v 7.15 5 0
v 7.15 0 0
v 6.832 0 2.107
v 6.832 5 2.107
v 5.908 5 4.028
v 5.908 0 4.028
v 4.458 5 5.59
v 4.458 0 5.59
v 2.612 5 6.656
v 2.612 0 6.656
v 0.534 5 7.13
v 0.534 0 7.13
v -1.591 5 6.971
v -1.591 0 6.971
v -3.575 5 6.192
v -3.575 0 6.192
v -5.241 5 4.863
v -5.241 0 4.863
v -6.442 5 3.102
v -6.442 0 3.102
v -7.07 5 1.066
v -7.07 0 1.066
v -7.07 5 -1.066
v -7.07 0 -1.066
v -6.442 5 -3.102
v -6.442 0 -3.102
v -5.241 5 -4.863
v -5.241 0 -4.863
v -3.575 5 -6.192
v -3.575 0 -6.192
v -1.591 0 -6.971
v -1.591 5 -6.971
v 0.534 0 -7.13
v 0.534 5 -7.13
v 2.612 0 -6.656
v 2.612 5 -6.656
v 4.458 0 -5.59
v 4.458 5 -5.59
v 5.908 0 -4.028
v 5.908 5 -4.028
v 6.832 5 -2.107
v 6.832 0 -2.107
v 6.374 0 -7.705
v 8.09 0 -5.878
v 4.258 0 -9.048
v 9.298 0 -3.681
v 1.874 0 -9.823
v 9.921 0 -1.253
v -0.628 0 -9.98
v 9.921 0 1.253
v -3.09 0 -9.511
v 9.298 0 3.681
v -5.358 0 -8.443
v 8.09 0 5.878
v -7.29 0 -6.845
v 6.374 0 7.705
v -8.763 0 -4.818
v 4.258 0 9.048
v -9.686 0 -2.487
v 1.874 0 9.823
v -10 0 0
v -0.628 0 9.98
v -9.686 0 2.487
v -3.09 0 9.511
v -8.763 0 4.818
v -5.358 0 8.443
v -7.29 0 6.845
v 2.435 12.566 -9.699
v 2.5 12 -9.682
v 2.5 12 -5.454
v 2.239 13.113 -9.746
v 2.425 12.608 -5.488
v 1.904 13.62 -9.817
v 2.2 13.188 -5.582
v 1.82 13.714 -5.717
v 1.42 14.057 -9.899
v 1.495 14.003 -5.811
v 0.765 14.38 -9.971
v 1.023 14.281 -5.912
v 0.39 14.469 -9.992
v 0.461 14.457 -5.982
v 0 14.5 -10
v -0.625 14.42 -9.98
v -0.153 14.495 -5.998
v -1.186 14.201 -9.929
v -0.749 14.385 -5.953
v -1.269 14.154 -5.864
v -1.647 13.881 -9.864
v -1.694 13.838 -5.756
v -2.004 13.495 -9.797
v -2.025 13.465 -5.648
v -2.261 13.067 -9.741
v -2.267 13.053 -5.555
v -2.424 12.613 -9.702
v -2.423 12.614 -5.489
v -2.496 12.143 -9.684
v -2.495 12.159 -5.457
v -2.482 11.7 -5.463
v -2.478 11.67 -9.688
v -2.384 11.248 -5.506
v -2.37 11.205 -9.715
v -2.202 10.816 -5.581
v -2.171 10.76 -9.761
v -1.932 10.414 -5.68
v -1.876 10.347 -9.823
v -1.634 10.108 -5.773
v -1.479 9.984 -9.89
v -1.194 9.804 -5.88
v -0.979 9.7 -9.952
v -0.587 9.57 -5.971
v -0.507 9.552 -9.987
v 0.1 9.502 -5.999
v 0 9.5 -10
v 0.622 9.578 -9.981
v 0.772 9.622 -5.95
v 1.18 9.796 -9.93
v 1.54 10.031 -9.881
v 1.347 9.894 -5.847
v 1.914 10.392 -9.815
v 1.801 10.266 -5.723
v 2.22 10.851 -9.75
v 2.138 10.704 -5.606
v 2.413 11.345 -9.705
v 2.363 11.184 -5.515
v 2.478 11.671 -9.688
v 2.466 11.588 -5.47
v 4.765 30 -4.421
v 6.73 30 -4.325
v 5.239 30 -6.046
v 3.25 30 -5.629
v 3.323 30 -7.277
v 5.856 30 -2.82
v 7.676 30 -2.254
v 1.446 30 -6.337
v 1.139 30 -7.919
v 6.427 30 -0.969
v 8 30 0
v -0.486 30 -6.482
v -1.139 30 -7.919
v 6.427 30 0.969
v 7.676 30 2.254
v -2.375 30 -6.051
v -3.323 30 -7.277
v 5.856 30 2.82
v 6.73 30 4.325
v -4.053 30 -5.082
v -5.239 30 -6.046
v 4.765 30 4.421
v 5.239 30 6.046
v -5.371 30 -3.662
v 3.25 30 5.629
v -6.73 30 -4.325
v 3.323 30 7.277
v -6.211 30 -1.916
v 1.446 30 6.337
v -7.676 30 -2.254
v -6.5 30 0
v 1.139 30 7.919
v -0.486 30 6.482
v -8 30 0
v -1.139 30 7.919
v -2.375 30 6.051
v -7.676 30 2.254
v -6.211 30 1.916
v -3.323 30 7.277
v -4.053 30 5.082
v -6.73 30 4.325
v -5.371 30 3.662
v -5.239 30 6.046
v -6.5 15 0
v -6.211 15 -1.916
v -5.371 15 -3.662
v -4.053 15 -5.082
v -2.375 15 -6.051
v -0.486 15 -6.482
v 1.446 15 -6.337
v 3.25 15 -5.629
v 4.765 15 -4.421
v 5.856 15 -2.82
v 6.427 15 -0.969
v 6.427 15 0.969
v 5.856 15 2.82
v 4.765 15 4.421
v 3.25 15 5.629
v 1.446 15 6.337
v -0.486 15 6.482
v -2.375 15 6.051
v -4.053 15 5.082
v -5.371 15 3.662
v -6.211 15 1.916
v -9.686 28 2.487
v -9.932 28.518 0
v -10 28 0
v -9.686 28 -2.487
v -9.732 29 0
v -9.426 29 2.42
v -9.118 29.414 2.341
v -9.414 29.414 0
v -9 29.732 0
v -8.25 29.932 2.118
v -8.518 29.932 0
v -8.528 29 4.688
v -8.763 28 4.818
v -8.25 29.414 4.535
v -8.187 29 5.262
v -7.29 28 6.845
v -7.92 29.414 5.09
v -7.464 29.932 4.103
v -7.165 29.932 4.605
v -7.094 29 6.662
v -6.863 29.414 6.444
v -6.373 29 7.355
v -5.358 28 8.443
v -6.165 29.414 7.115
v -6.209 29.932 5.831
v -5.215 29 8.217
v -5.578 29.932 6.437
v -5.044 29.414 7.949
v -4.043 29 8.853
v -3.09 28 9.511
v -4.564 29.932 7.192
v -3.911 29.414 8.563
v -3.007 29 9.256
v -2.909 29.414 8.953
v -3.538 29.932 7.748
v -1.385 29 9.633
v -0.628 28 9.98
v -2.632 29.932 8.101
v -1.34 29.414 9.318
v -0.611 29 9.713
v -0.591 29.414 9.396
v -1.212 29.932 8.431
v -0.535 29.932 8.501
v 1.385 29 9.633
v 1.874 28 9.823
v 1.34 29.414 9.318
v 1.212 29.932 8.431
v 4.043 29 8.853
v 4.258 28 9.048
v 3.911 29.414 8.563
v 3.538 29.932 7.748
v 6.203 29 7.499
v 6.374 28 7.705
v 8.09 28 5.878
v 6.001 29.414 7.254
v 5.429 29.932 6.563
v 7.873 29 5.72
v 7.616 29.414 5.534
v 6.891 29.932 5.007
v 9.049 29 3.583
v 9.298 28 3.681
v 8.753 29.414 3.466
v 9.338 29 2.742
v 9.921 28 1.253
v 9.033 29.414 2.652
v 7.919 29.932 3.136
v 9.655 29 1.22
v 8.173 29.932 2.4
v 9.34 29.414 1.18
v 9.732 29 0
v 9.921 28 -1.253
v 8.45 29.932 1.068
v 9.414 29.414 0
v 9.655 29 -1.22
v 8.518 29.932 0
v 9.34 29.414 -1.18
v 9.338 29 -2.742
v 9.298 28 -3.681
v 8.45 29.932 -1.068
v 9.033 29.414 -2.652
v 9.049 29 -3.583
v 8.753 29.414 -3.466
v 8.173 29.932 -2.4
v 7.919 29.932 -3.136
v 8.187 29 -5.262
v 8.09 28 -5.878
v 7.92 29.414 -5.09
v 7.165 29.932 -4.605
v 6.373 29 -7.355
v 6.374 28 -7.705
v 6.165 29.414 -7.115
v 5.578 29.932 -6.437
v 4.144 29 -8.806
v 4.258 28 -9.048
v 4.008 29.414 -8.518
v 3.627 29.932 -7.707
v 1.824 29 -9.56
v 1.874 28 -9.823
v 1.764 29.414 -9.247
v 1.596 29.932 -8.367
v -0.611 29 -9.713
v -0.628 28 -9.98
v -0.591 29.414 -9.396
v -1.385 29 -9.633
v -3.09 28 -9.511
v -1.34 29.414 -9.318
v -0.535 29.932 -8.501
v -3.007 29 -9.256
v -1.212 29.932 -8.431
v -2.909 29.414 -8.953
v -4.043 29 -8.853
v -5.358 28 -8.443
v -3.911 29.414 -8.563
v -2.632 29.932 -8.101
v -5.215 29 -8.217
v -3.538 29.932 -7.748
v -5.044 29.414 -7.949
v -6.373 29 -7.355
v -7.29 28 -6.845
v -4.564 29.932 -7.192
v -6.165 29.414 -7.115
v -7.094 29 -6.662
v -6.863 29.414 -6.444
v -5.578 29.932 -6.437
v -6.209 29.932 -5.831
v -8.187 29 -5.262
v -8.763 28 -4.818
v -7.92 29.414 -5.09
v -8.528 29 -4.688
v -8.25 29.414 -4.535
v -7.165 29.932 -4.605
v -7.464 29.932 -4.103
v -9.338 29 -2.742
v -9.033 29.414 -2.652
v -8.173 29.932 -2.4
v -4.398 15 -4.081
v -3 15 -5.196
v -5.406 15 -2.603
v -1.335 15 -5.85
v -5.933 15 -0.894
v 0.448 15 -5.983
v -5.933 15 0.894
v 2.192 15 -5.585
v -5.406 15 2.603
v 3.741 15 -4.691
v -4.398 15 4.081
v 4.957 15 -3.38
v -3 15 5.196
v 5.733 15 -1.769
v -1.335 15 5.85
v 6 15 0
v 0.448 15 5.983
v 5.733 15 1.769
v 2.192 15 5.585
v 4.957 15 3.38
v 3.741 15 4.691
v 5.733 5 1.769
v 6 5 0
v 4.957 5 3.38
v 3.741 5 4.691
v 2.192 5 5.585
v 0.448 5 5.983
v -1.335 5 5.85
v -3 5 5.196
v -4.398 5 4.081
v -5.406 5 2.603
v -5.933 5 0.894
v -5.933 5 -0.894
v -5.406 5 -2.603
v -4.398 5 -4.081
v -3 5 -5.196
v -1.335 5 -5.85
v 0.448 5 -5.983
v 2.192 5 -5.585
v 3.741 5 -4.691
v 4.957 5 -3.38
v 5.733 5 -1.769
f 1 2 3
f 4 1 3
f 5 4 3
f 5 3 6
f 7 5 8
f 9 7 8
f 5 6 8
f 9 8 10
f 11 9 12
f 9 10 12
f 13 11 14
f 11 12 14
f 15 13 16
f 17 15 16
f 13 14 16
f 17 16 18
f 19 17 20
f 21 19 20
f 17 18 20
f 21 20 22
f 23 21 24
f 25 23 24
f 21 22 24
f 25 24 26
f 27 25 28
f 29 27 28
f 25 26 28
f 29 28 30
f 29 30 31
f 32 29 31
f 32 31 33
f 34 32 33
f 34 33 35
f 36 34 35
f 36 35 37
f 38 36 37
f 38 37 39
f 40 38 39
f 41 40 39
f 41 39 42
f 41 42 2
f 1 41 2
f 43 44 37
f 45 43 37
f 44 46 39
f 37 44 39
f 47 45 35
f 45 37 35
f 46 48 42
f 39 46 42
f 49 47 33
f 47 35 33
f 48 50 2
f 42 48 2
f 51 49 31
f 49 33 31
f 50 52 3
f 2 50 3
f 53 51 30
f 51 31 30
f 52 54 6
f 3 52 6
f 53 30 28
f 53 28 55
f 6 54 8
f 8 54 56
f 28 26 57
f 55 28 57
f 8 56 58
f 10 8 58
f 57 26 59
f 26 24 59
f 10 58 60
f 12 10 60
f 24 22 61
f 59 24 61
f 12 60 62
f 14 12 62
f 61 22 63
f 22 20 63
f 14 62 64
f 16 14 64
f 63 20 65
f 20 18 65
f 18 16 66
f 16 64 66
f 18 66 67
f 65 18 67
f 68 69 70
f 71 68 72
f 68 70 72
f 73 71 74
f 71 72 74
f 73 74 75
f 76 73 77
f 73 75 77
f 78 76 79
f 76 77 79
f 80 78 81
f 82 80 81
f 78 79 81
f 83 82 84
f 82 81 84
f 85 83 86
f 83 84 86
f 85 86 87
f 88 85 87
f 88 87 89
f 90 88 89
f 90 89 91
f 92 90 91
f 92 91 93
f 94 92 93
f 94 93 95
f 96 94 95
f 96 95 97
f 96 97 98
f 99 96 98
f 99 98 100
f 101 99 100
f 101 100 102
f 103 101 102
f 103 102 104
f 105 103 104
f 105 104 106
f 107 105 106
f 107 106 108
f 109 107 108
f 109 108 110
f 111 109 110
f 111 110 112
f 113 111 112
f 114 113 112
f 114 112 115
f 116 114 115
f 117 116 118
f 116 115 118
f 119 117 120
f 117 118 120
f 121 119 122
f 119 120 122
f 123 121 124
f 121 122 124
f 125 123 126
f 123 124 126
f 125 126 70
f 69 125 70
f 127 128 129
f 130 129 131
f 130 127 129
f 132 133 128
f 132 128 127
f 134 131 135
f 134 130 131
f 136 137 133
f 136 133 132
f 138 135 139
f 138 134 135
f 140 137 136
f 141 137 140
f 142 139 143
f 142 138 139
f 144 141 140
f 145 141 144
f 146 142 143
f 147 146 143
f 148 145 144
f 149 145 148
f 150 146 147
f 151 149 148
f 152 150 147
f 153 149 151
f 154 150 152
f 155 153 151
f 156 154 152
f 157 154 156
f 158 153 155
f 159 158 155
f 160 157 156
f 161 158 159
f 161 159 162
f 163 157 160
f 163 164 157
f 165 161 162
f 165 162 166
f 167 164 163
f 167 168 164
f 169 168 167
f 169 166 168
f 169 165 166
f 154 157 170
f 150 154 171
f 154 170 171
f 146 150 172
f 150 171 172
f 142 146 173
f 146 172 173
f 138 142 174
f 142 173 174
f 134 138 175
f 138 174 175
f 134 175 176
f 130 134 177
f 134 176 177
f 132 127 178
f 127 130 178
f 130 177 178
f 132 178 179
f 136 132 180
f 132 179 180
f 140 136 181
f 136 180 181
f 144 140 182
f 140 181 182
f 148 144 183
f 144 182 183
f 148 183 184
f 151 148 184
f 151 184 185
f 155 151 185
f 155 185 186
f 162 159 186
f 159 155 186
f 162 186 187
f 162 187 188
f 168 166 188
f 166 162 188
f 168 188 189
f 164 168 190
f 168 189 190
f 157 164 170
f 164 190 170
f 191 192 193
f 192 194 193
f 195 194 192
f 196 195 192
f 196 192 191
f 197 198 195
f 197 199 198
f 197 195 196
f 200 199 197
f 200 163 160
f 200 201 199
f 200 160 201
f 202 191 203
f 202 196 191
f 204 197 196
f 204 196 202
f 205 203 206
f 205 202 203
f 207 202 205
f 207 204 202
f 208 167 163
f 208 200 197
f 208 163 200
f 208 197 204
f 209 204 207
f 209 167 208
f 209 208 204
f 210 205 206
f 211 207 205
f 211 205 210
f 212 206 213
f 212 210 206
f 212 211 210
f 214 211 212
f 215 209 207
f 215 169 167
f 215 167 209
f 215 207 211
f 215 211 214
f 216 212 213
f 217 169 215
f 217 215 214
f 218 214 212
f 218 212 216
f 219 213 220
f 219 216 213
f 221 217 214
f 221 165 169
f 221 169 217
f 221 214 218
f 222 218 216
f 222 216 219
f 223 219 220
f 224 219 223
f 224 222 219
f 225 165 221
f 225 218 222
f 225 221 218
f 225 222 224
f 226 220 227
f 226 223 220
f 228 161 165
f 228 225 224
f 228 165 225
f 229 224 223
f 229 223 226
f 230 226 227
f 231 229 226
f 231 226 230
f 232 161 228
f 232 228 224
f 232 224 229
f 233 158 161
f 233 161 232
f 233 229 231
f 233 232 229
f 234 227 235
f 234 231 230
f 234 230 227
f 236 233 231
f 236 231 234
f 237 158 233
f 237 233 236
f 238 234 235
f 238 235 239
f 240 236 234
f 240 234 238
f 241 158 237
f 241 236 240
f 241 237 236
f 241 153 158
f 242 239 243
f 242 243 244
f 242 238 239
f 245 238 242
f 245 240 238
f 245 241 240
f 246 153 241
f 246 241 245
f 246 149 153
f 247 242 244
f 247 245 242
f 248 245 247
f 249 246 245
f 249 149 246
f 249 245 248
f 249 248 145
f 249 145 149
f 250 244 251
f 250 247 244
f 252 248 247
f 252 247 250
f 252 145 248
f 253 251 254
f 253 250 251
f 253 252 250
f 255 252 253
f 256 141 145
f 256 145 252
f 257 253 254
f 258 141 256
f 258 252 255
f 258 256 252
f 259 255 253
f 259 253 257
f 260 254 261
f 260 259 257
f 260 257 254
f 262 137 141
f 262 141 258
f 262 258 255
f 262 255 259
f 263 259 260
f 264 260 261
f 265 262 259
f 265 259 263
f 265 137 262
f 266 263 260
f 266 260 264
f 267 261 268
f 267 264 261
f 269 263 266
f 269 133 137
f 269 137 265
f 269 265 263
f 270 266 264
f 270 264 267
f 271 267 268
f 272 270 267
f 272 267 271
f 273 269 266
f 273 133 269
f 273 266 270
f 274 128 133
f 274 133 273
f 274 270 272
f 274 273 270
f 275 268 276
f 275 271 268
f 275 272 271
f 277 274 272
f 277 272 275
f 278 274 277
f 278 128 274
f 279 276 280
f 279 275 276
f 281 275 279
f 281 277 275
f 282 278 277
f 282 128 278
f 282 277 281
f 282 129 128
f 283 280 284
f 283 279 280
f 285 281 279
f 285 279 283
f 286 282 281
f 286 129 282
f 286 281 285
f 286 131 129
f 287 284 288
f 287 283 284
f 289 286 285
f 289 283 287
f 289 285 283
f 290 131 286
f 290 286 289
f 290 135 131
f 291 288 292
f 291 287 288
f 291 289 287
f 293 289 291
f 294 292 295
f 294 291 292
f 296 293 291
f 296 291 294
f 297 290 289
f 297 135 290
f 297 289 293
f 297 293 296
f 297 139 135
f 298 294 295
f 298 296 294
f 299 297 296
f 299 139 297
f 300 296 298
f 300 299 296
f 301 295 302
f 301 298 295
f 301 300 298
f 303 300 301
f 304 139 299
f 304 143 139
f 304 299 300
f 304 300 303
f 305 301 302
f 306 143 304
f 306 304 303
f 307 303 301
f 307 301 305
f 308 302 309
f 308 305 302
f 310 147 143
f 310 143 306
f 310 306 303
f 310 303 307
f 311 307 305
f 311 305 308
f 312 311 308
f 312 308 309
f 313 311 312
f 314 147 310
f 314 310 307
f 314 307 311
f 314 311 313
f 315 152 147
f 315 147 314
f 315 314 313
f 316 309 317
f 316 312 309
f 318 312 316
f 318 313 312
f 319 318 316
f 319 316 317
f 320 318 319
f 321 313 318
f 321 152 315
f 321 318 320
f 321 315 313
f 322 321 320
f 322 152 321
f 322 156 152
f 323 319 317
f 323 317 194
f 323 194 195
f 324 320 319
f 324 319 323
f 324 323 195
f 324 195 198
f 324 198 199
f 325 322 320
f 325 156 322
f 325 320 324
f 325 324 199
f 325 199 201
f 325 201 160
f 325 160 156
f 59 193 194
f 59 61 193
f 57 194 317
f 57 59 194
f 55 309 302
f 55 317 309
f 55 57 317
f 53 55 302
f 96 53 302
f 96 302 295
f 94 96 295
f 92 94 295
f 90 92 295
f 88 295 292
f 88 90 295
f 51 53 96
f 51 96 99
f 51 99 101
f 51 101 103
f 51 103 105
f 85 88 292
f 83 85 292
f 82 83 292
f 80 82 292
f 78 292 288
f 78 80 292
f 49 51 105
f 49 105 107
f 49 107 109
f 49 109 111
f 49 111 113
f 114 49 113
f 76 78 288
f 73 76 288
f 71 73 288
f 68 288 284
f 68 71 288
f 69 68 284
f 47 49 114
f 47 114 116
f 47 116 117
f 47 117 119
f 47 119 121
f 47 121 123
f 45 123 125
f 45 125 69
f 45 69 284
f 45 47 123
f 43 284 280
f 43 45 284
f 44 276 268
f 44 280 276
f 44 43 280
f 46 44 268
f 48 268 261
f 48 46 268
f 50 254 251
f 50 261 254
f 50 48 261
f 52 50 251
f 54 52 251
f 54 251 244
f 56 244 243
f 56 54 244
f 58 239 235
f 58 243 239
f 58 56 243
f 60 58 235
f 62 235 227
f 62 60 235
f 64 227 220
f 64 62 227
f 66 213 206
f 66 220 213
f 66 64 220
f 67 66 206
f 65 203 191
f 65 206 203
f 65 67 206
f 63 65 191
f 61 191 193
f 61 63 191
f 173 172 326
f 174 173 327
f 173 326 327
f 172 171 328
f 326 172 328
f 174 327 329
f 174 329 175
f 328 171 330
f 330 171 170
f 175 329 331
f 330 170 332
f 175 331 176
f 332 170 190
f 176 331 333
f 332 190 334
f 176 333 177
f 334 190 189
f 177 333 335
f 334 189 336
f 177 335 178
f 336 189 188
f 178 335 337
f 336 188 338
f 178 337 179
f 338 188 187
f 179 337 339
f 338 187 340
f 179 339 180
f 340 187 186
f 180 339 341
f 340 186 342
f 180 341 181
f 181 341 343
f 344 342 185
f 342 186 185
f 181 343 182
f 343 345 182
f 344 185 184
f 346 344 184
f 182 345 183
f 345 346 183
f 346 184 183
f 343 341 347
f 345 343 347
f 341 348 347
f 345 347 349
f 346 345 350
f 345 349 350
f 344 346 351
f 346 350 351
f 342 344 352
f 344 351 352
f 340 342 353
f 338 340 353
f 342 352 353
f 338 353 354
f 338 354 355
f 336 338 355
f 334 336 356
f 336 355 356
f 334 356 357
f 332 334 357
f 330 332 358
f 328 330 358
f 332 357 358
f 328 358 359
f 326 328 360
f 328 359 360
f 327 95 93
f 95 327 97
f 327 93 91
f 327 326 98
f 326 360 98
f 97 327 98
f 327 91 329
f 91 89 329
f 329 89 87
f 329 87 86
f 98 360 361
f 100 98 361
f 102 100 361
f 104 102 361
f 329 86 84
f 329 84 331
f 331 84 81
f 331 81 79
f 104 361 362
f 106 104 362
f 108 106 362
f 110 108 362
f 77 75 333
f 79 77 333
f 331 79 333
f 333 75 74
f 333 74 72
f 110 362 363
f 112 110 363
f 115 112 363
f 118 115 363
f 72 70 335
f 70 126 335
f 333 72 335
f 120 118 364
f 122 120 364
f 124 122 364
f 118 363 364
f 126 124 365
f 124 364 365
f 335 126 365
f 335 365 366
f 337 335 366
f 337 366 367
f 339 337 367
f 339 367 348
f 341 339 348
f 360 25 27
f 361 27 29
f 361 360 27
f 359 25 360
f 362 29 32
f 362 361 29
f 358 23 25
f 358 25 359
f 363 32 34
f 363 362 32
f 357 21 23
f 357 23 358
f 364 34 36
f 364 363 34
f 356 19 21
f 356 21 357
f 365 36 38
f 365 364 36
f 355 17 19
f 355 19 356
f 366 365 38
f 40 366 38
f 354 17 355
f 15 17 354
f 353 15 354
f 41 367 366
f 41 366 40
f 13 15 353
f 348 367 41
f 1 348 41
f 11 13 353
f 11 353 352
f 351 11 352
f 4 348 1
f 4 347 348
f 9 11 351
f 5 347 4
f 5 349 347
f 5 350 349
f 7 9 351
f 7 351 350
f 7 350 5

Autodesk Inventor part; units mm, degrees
ref_plane "YZ Plane" through (0, 0, 0) normal (1, 0, 0) x (0, 1, 0)
ref_plane "XZ Plane" through (0, 0, 0) normal (0, 1, 0) x (-1, 0, 0)
ref_plane "XY Plane" through (0, 0, 0) normal (0, 0, 1) x (1, 0, 0)
sketch "Sketch1" plane through (0, 0, 0) normal (0, 1, 0) x (-1, 0, 0)
  circle A0 centre (0, 0) radius 6.5
  circle A1 centre (0, 0) radius 10
  dimension "d0" = 13
  dimension "d1" = 20
extrude "Extrusion1" add sketch "Sketch1" along normal blind 30
sketch "Sketch2" plane through (0, 0, 0) normal (0, -1, 0) x (1, 0, 0)
  circle A0 centre (0, 0) radius 6
  circle A1 centre (0, 0) radius 6.5 projected
  dimension "d4" = 12
extrude "Extrusion2" add sketch "Sketch2" against normal blind 15
sketch "Sketch3" plane through (0, 0, 0) normal (0, -1, 0) x (1, 0, 0)
  circle A0 centre (0, 0) radius 7.15
  dimension "d7" = 14.3
extrude "Extrusion3" cut sketch "Sketch3" against normal blind 5
fillet "Fillet1" radius 2 1 edges at (10, 30, 0)
sketch "Sketch4" plane through (0, 0, 0) normal (0, 0, 1) x (1, 0, 0)
  circle A0 centre (0, 12) radius 2.5
  line L0 (-8, 30) -> (8, 30) projected
  point P0 (0, 0)
  dimension "d11" = 5
  dimension "d12" = 18
extrude "Extrusion4" cut sketch "Sketch4" against normal blind 10
properties part number "ConnectorC"
